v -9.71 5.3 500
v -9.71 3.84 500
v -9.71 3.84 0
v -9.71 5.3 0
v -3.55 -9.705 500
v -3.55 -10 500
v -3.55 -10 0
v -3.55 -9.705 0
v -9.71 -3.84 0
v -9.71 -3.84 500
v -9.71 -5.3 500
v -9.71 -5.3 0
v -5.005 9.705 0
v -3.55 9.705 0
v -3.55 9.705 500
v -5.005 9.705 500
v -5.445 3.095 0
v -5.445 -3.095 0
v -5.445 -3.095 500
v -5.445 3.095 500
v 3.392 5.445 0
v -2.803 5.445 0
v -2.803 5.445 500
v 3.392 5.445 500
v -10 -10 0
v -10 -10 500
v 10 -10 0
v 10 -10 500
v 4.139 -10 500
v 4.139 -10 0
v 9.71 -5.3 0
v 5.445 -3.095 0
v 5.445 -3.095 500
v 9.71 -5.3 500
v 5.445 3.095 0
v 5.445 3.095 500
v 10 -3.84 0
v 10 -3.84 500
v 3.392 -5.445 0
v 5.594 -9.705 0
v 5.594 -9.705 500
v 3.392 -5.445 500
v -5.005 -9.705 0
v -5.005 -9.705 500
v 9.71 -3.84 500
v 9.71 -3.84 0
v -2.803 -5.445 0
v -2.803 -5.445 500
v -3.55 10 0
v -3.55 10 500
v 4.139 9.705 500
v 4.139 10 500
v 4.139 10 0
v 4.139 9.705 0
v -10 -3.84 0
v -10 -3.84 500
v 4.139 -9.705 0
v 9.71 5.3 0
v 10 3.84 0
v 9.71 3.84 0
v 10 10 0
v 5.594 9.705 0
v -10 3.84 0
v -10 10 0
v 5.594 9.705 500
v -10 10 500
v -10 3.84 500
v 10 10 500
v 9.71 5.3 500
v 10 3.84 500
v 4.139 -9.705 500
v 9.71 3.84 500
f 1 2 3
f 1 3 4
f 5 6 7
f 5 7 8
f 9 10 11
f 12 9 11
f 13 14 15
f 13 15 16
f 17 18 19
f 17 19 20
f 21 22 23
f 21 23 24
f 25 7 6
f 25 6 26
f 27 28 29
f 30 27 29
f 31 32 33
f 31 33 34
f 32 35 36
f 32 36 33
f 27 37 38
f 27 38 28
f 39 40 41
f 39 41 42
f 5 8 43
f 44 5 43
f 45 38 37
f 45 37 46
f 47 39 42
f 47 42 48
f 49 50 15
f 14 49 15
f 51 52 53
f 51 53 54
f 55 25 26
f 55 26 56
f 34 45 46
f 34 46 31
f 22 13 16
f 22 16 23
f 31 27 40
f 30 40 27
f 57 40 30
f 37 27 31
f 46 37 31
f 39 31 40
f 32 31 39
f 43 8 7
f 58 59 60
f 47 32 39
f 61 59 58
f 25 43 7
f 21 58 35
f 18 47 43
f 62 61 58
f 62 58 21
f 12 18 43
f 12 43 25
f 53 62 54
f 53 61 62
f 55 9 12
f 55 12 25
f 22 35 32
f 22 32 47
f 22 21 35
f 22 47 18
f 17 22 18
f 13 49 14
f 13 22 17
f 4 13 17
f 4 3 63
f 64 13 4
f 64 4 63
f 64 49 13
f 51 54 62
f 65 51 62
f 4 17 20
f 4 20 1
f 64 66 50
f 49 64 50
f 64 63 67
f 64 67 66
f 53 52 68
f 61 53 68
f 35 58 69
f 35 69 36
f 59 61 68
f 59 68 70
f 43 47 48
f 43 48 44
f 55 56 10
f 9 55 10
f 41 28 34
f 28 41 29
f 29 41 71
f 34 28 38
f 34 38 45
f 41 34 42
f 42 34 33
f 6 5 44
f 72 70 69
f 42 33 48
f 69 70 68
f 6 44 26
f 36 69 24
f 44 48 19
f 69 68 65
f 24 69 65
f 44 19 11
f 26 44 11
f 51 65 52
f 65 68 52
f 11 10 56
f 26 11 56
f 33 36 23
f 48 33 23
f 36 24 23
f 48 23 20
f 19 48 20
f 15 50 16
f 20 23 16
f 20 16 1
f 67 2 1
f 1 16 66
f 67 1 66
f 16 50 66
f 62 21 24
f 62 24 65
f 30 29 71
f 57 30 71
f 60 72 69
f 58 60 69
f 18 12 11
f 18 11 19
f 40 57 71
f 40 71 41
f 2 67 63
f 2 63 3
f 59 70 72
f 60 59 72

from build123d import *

# Parameters (mm, degrees)
Y_KSEKLIK_EKSTR_ZYON1_DEPTH = 500
Y_KSEKLIK_EKSTR_ZYON3_DEPTH = 500


with BuildPart() as part:
    # Çizim1 → Yükseklik-Ekstrüzyon1 (new body)
    with BuildSketch(Plane.XY):
        Polygon((-5.15760167, 10), (-2.80302277, 5.444963707), (3.391667495, 5.444963707), (5.746246396, 10), (10, 10), (10, 5.45), (5.445076204, 3.095), (5.445076204, -3.095), (10, -5.45), (10, -10), (5.746246396, -10), (3.391667495, -5.444963707), (-2.80302277, -5.444963707), (-5.15760167, -10), (-10, -10), (-10, -5.45), (-5.445076204, -3.095), (-5.445076204, 3.095), (-10, 5.45), (-10, 10), align=None)
    extrude(amount=Y_KSEKLIK_EKSTR_ZYON1_DEPTH)

    # Çizim4 → Yükseklik-Ekstrüzyon3 (add)
    with BuildSketch(Plane.XY.offset(500)):
        Polygon((-5.15760167, 10), (-3.54995598, 10), (-3.54995598, 9.705121592), (-5.005173801, 9.705121592), align=None)
        Polygon((10, 3.84), (9.71, 3.84), (9.71, 5.300063353), (10, 5.45), align=None)
        Polygon((5.593818526, 9.705121592), (5.746246396, 10), (4.138600705, 10), (4.138600705, 9.705121592), align=None)
        Polygon((5.746246396, -10), (4.138600705, -10), (4.138600705, -9.705121592), (5.593818526, -9.705121592), align=None)
        Polygon((-5.005173801, -9.705121592), (-5.15760167, -10), (-3.54995598, -10), (-3.54995598, -9.705121592), align=None)
        Polygon((-10, 5.45), (-10, 3.84), (-9.71, 3.84), (-9.71, 5.300063353), align=None)
        Polygon((9.71, -5.300063353), (10, -5.45), (10, -3.84), (9.71, -3.84), align=None)
        Polygon((-9.71, -5.300063353), (-10, -5.45), (-10, -3.84), (-9.71, -3.84), align=None)
    extrude(amount=-Y_KSEKLIK_EKSTR_ZYON3_DEPTH)


solid = part.part
